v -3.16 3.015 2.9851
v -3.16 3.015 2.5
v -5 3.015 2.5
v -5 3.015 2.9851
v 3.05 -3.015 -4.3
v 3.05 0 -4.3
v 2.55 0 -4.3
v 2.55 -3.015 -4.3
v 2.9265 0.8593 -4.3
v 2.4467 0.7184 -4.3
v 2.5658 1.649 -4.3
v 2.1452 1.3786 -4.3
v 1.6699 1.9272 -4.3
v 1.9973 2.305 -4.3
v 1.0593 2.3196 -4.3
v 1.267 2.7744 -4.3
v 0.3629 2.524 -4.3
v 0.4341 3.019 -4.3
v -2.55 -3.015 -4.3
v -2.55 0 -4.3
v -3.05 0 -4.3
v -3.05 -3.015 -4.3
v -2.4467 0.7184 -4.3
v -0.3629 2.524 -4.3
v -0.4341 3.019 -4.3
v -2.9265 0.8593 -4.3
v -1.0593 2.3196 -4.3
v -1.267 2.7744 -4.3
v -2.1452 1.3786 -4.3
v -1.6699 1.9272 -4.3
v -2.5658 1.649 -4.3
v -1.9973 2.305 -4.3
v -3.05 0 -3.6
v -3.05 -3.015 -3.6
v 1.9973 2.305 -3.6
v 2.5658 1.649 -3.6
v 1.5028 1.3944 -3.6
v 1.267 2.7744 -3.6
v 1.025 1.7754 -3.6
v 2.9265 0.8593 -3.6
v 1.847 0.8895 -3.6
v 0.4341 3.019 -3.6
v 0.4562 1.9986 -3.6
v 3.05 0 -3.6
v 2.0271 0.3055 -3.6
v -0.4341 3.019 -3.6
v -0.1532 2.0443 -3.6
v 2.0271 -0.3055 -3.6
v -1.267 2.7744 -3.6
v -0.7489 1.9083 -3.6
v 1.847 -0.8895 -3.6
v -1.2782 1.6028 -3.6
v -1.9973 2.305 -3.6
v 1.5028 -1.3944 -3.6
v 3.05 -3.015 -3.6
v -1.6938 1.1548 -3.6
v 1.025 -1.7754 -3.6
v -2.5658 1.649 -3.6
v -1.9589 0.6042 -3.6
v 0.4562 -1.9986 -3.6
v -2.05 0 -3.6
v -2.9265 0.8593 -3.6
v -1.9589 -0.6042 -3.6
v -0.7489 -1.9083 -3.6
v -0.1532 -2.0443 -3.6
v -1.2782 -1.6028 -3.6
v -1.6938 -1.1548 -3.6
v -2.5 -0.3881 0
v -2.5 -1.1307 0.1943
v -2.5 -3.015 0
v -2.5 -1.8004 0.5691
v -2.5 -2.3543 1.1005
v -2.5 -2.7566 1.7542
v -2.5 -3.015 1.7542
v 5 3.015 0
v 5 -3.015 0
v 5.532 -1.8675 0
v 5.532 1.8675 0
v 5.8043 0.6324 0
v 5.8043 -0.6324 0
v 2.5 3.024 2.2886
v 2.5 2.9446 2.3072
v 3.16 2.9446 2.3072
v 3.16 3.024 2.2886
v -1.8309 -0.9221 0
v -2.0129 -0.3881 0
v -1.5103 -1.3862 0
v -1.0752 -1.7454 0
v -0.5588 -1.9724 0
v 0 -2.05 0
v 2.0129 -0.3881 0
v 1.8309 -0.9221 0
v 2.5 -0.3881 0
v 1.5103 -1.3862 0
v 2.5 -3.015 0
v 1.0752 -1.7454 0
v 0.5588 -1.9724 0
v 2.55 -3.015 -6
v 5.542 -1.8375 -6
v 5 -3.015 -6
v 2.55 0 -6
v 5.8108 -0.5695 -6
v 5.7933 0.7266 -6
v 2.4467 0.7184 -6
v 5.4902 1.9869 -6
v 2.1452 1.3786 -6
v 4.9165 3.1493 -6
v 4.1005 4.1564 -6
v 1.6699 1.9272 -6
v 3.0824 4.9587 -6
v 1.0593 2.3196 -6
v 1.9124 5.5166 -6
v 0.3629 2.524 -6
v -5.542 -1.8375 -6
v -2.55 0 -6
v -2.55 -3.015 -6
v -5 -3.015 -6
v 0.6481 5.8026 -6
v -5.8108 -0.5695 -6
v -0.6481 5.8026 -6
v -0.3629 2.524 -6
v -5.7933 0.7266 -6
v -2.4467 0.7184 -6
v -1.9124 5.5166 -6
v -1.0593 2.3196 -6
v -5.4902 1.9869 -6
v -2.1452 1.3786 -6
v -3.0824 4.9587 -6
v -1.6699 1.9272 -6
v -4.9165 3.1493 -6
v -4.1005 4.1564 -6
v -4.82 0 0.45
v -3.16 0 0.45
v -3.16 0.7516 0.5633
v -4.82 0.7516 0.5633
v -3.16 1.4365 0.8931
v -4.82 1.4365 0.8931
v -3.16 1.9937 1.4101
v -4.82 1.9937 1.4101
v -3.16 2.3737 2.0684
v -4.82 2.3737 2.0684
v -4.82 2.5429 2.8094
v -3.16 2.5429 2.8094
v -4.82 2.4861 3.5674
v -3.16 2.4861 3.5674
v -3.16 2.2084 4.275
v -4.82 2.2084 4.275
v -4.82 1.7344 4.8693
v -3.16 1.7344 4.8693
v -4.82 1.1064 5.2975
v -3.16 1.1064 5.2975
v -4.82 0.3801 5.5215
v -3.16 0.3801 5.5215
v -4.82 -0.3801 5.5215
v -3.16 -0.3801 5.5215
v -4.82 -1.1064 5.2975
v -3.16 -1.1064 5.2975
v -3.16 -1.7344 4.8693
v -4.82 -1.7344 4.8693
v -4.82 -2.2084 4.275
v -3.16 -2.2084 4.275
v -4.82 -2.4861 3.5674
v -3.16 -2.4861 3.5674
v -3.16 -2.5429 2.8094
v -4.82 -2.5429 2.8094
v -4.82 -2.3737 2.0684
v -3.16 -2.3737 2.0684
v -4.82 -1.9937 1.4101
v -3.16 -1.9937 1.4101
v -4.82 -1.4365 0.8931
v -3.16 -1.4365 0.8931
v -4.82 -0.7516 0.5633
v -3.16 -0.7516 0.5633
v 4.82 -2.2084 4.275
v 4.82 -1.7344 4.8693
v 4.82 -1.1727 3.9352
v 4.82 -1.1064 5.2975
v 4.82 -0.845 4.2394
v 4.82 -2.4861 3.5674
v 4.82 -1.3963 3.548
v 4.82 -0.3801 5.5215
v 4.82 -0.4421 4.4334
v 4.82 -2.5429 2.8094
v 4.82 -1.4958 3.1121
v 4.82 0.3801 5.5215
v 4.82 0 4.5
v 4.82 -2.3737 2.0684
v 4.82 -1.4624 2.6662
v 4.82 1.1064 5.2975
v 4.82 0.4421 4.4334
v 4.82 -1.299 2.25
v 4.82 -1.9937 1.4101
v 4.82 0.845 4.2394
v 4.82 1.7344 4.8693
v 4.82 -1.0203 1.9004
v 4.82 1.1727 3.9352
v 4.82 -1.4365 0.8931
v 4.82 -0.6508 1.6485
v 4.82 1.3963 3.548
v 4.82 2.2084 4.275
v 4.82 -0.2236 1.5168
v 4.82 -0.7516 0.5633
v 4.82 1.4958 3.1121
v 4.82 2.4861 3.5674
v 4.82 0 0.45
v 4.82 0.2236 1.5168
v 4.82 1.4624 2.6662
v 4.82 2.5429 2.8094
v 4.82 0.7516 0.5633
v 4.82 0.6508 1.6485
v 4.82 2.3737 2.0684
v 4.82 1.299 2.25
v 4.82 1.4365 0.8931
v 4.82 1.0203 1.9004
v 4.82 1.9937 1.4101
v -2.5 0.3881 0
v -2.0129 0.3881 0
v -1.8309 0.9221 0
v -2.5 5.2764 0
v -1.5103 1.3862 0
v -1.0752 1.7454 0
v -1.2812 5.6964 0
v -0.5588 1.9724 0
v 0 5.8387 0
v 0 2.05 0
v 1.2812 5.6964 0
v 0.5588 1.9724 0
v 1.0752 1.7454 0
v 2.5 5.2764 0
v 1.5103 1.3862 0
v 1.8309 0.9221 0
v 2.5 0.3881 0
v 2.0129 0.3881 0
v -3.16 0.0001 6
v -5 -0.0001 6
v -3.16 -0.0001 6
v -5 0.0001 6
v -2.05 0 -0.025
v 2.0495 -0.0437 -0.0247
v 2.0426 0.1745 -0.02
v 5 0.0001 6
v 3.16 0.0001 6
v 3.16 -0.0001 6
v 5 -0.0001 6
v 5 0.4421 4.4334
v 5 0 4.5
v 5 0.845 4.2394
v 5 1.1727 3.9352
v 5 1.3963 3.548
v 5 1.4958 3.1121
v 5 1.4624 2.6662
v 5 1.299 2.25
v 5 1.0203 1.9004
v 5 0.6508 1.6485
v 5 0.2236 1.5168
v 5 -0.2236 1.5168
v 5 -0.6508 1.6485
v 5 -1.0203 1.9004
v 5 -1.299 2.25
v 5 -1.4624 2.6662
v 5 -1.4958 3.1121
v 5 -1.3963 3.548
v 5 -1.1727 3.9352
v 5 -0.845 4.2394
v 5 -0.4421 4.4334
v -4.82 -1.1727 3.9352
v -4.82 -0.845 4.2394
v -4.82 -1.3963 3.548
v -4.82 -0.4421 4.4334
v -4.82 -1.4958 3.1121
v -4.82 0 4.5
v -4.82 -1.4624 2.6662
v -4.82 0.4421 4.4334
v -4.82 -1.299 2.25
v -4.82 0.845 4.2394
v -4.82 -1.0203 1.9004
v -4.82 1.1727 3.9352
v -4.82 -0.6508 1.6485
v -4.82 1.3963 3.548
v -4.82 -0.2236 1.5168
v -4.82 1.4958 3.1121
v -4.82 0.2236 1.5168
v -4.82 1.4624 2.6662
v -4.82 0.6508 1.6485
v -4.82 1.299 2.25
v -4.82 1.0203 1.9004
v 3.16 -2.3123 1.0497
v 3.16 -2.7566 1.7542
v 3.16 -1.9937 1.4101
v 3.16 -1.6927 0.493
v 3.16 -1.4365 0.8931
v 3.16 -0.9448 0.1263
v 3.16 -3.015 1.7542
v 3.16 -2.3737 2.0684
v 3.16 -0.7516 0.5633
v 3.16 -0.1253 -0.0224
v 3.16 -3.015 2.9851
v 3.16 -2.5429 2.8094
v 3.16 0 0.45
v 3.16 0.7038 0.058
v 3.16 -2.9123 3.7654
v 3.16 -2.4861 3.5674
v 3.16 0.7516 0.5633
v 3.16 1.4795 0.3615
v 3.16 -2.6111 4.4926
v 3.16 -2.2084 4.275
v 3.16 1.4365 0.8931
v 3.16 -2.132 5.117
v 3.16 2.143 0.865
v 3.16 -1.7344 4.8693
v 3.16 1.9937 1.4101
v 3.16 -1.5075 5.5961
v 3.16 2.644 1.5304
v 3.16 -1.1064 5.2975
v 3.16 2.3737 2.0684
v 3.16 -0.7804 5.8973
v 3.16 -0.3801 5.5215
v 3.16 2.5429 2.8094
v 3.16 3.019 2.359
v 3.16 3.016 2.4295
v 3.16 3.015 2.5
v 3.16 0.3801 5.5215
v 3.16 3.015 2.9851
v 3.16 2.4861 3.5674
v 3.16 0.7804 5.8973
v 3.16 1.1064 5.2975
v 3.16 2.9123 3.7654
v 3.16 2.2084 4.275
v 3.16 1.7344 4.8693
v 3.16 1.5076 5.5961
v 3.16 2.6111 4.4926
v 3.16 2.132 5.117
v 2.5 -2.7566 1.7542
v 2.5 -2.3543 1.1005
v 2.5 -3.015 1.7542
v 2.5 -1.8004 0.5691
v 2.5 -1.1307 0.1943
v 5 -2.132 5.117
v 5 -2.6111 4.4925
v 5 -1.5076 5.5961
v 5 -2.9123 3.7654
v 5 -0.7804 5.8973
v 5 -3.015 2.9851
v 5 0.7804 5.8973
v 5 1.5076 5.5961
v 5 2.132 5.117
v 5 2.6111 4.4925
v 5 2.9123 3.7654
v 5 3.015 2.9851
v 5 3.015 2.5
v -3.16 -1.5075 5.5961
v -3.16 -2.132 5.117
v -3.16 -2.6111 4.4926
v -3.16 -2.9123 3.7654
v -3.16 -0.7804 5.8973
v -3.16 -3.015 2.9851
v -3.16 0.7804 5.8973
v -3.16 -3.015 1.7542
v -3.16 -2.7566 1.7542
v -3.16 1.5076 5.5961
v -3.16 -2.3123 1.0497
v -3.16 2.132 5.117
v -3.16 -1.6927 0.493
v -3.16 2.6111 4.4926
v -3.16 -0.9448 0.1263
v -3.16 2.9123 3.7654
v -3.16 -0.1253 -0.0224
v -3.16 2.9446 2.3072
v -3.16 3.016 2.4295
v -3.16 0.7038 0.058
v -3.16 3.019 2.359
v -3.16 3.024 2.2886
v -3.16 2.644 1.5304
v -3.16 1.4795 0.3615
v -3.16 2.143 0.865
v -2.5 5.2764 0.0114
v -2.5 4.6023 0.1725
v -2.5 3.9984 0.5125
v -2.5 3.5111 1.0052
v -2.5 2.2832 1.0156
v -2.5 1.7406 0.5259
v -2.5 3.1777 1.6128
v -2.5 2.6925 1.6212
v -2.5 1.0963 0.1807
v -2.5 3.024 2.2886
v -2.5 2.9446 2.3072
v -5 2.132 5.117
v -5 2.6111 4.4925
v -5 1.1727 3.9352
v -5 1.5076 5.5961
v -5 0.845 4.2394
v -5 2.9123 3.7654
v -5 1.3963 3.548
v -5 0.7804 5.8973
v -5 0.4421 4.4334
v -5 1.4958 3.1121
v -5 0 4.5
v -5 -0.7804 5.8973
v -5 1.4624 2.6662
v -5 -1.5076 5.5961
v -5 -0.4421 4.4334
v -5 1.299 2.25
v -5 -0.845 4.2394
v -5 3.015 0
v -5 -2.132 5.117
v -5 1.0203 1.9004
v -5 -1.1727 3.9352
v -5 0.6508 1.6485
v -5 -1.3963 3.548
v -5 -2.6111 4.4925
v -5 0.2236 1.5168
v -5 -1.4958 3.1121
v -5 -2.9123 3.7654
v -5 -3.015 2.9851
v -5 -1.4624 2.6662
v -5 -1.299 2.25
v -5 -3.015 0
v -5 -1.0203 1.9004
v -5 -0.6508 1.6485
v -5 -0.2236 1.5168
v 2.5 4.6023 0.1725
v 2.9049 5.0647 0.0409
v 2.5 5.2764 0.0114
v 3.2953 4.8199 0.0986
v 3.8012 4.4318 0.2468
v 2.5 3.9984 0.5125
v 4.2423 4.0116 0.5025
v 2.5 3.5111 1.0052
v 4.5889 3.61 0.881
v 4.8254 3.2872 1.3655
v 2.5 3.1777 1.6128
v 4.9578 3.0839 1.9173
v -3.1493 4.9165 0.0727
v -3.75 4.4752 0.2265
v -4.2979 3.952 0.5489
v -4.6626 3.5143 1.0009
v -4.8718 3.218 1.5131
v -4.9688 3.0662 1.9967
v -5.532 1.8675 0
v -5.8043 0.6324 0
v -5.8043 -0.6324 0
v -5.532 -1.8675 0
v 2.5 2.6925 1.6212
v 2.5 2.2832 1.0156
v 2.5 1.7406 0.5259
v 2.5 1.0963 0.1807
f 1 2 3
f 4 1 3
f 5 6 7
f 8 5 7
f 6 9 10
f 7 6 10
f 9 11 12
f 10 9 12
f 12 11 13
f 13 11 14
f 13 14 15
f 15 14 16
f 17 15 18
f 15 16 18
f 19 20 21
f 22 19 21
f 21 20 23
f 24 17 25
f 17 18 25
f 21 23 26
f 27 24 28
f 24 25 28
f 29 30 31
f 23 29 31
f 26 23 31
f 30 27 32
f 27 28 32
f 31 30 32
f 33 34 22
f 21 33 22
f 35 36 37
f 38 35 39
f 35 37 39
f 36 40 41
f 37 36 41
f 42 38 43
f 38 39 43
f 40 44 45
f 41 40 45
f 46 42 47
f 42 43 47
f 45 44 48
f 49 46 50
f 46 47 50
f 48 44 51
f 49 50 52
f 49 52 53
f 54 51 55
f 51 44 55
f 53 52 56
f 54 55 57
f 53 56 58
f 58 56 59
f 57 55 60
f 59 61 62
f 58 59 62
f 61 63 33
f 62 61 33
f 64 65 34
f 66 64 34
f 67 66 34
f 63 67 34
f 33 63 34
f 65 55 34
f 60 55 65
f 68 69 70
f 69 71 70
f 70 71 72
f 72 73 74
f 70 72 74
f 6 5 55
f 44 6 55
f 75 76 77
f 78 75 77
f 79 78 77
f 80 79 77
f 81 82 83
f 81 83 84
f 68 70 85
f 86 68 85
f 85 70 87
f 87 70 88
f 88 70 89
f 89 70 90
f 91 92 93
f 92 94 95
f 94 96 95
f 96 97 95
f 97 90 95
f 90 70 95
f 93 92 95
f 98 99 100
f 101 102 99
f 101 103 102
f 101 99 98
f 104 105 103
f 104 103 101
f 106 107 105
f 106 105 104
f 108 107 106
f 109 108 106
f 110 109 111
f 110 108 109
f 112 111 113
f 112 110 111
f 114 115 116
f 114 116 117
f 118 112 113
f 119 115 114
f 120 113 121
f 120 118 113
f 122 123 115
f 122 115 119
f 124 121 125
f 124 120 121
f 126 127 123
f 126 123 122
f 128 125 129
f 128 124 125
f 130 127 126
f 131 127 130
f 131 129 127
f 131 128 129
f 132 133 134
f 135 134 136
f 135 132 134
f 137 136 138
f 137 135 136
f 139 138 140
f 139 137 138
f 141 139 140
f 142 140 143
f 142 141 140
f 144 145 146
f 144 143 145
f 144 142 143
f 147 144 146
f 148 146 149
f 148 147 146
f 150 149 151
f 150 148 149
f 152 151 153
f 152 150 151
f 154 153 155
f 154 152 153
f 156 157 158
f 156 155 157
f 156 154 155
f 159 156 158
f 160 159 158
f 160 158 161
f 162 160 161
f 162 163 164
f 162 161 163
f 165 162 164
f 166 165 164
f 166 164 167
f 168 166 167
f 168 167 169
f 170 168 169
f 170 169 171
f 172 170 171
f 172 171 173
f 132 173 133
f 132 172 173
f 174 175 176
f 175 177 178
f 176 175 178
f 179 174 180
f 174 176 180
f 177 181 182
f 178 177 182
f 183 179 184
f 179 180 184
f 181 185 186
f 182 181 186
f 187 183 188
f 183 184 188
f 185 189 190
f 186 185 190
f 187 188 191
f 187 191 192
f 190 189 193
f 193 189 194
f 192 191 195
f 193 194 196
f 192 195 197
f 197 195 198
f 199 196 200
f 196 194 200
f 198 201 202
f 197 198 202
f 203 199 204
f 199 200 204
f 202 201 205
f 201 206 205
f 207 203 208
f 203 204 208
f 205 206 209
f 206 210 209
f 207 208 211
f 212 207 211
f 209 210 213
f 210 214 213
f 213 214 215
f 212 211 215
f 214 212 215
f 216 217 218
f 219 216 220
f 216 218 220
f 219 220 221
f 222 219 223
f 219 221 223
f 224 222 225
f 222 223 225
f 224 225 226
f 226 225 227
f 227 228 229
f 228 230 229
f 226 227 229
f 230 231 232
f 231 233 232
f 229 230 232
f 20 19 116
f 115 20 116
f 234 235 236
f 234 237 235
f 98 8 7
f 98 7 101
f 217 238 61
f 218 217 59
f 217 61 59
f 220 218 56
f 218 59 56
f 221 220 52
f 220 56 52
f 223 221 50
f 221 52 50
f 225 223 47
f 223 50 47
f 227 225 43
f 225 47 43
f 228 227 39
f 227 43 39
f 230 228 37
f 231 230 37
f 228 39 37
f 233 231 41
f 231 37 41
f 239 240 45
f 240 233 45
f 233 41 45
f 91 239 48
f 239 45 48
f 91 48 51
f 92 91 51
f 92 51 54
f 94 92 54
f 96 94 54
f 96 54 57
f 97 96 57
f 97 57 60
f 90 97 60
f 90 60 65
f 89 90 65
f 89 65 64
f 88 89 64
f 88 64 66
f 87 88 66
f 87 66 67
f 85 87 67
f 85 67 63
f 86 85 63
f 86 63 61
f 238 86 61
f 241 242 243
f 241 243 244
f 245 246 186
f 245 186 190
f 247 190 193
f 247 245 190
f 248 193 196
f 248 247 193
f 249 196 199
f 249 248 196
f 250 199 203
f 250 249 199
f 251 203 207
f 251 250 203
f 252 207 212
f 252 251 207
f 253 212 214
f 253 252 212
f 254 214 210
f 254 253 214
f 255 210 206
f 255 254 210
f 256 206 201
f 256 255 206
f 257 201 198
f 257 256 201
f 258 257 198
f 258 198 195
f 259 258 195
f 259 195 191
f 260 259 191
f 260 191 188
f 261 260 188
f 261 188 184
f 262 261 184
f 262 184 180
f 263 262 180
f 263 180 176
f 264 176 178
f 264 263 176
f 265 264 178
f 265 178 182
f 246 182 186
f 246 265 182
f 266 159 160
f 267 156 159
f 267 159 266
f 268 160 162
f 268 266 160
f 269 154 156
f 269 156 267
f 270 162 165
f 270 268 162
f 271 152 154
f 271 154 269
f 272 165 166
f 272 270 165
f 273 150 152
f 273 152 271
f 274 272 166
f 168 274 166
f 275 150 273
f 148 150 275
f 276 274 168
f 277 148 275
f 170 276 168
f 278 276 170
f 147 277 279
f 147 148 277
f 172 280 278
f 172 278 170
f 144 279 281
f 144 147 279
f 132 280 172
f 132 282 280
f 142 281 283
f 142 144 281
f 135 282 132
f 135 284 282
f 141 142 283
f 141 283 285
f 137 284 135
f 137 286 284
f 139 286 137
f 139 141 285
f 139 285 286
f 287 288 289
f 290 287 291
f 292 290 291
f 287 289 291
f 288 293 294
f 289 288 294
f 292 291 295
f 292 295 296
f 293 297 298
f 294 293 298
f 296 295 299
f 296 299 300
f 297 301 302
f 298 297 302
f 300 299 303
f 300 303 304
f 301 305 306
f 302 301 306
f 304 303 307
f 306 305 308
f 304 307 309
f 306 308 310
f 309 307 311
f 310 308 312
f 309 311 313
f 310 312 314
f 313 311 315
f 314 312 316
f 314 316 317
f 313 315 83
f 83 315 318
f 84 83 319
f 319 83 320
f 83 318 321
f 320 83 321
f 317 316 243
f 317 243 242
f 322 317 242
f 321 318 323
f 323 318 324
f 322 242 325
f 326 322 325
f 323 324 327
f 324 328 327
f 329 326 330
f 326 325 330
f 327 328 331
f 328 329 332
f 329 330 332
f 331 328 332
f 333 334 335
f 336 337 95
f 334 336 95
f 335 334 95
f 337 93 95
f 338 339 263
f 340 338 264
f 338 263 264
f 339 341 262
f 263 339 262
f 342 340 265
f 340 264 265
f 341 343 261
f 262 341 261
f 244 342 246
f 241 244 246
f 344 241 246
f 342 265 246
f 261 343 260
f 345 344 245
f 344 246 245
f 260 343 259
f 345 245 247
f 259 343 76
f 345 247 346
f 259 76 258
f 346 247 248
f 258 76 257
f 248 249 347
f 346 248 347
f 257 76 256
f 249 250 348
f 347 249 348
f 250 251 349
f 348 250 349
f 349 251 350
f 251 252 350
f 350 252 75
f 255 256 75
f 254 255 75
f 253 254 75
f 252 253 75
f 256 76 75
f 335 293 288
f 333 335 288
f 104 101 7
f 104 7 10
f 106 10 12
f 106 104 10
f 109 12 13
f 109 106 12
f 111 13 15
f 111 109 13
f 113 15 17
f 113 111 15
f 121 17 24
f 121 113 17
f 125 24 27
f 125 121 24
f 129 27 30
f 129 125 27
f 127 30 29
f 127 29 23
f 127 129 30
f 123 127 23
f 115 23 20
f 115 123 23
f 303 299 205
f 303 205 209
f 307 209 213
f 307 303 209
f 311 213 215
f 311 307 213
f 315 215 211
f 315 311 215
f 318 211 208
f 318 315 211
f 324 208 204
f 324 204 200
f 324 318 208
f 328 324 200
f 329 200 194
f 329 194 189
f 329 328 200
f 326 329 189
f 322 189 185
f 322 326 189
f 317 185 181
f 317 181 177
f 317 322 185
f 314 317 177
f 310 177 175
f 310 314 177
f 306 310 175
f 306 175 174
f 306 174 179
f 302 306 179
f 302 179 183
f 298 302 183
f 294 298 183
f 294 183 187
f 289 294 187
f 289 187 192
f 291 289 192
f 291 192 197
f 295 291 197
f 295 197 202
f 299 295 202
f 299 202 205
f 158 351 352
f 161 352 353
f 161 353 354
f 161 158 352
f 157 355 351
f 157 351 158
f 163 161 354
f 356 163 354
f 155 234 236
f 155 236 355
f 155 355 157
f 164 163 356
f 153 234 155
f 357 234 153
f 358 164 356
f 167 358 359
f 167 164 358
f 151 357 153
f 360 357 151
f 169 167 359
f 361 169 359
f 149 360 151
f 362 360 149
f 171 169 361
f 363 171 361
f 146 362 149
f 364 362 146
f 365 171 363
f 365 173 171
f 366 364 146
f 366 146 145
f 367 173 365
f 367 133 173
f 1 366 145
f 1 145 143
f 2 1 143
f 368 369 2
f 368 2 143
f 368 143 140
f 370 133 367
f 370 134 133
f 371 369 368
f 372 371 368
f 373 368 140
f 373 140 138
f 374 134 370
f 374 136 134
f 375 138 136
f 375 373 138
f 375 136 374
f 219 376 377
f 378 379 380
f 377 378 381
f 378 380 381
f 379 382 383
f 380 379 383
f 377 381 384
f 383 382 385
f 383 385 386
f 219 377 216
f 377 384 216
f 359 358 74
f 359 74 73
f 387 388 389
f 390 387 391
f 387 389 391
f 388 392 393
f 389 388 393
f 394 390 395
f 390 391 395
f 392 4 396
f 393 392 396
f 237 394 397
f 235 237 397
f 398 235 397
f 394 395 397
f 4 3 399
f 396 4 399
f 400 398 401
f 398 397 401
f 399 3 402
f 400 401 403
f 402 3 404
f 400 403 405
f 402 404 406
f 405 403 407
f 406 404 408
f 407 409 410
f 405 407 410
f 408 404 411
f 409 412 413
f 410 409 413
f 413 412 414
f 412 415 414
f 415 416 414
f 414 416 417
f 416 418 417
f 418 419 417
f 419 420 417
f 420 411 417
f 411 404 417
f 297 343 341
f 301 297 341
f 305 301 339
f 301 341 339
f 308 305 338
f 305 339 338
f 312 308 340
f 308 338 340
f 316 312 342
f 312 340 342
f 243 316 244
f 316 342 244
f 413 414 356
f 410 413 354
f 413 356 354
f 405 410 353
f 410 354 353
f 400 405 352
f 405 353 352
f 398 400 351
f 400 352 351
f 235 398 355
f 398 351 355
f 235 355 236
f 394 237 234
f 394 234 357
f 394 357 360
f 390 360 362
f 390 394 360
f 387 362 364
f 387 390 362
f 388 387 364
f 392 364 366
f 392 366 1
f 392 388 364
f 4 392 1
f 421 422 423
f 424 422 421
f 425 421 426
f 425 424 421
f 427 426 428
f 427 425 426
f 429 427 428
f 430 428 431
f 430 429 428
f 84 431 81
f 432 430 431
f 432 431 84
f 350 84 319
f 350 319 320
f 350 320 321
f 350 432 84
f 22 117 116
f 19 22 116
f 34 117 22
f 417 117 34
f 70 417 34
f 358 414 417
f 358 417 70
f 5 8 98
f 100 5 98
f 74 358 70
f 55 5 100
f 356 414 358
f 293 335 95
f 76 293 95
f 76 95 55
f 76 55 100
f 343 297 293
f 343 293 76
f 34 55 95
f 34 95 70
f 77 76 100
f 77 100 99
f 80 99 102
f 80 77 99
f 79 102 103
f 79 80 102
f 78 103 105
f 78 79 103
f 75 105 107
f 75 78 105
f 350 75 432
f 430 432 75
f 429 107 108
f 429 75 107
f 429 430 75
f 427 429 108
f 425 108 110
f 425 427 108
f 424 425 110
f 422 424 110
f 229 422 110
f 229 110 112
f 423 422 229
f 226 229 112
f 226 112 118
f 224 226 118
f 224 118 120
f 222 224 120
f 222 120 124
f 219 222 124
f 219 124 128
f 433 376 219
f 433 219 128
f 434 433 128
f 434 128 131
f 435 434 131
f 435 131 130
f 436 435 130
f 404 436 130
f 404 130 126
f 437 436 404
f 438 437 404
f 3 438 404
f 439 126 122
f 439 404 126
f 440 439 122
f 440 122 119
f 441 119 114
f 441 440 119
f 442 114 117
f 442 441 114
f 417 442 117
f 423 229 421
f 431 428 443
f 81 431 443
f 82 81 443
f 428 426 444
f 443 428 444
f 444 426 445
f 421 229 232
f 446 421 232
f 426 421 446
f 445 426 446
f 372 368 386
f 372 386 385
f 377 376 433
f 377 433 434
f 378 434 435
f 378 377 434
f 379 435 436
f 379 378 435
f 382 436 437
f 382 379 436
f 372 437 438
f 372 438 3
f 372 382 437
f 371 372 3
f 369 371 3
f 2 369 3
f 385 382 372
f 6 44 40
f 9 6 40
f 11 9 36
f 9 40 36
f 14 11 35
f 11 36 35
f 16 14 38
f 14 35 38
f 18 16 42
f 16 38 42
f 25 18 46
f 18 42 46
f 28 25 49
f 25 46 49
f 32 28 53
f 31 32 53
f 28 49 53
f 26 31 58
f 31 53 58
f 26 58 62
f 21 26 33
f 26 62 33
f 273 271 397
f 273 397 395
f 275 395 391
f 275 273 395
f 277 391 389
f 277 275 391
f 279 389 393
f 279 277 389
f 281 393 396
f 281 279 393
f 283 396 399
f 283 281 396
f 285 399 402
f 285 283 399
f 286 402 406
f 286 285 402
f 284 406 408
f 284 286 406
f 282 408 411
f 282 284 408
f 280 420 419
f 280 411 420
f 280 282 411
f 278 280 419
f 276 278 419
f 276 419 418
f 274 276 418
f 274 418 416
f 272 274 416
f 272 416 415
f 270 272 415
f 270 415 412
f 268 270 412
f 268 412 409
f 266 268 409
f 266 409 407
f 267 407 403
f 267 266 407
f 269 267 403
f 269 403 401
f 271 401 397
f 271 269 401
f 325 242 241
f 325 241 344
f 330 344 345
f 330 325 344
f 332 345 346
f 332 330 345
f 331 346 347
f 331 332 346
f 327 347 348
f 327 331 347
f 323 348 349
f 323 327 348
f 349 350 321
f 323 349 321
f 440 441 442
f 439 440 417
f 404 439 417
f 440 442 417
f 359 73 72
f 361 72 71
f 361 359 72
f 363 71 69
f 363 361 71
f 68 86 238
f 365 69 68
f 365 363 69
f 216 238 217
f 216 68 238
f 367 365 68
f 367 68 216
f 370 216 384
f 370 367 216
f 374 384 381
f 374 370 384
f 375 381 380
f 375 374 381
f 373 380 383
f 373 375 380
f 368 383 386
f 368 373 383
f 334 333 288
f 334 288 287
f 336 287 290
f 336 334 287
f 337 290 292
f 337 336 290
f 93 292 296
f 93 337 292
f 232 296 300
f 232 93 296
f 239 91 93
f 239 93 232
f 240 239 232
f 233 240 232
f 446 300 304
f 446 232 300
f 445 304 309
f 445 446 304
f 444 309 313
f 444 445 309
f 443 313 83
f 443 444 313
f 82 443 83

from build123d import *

# Parameters (mm, degrees)
BOSS_EXTRUDE1_DEPTH      = 6
BOSS_EXTRUDE1_2_DEPTH    = 6
SKETCH2_R                = 5.838683498871983
BOSS_EXTRUDE2_DEPTH      = 6
CUT_EXTRUDE1_DEPTH       = 14.695520617658893
CUT_EXTRUDE1_DEPTH_BACK  = 14.695520617658893
SKETCH4_R                = 1.5000000000000004
SKETCH5_W                = 10
SKETCH5_H                = 5.878381978264198
CUT_EXTRUDE2_DEPTH       = 6
CUT_EXTRUDE19_DEPTH      = 11.206882481933452
CUT_EXTRUDE19_DEPTH_BACK = 11.206882481933452
SKETCH31_R               = 1.1
SKETCH33_W               = 5.1
SKETCH33_H               = 1.7000000000000002
CUT_EXTRUDE20_DEPTH      = 6.03
BOSS_EXTRUDE3_DEPTH      = 0.7
BOSS_EXTRUDE4_DEPTH      = 1.7
CUT_EXTRUDE21_START      = 0.7
SKETCH36_R               = 3.05
CUT_EXTRUDE21_DEPTH      = 0.7
SKETCH37_R               = 2.05
CUT_EXTRUDE22_DEPTH      = 6.03
FILLET1_R                = 3.015
FILLET2_R                = 2.5
CUT_EXTRUDE23_DEPTH      = 4.82
CUT_EXTRUDE23_DEPTH_BACK = 4.82
SKETCH39_R               = 2.5500000000000003
CUT_EXTRUDE24_DEPTH      = 3.16
CUT_EXTRUDE24_DEPTH_BACK = 3.16
SKETCH40_R               = 3.025
CHAMFER1_START           = -3.16
CHAMFER1_DEPTH           = 6.32


with BuildPart() as part:
    # Sketch1 → Boss-Extrude1 (new body)
    with BuildSketch(Plane.XY):
        Polygon((-2.4999999999999982, -3.015), (-2.499999999999999, 3.015), (-4.999999999999999, 3.015), (-4.999999999999999, -3.015), align=None)
    extrude(amount=BOSS_EXTRUDE1_DEPTH)



with BuildPart() as body_2:
    # Sketch1 → Boss-Extrude1 2 (new body)
    with BuildSketch(Plane.XY):
        Polygon((5.000000000000001, 3.015), (2.500000000000001, 3.015), (2.5000000000000018, -3.015), (5.000000000000001, -3.015), align=None)
    extrude(amount=BOSS_EXTRUDE1_2_DEPTH)


with BuildPart() as part_1:
    add(part.part)

    add(body_2.part)  # Boss-Extrude2 merges body 2
    # Sketch2 → Boss-Extrude2 (add)
    with BuildSketch(Plane(origin=(0, 0, 0), x_dir=(-1, 0, 0), z_dir=(0, 0, -1))):
        with Locations(Location((0, 0, 0), (0, 0, 148.91002298))):
            Circle(SKETCH2_R)
    extrude(amount=BOSS_EXTRUDE2_DEPTH)

    # Sketch4 → Cut-Extrude1 (cut, two sides: drawn at the far end of the back side and taken through both)
    with BuildSketch(Plane.ZY.offset(4.999999999999999).offset(-CUT_EXTRUDE1_DEPTH_BACK)):
        with Locations((3, 0)):
            Circle(SKETCH4_R)
    extrude(amount=CUT_EXTRUDE1_DEPTH + CUT_EXTRUDE1_DEPTH_BACK, mode=Mode.SUBTRACT)

    # Sketch5 → Cut-Extrude2 (cut)
    with BuildSketch(Plane.XY):
        with Locations((4.4e-16, -5.954190989132099)):
            Rectangle(SKETCH5_W, SKETCH5_H)
    extrude(amount=-CUT_EXTRUDE2_DEPTH, mode=Mode.SUBTRACT)

    # Sketch31 → Cut-Extrude19 (cut, two sides: drawn at the far end of the back side and taken through both)
    with BuildSketch(Plane.XY.offset(-CUT_EXTRUDE19_DEPTH_BACK)):
        Circle(SKETCH31_R)
    extrude(amount=CUT_EXTRUDE19_DEPTH + CUT_EXTRUDE19_DEPTH_BACK, mode=Mode.SUBTRACT)

    # Sketch33 → Cut-Extrude20 (cut)
    with BuildSketch(Plane(origin=(0, -3.015, 0), x_dir=(-1, 0, 0), z_dir=(0, -1, 0))):
        with Locations((-8.9e-16, 5.15)):
            Rectangle(SKETCH33_W, SKETCH33_H)
        Polygon((3.0500000000000056, 4.299999999999999), (2.549999999999999, 4.299999999999999), (-2.5500000000000007, 4.3), (-3.049999999999994, 4.299999999999999), (-3.049999999999994, 3.599999999999999), (3.0500000000000056, 3.6), align=None)
    extrude(amount=-CUT_EXTRUDE20_DEPTH, mode=Mode.SUBTRACT)

    # Sketch34 → Boss-Extrude3 (add)
    with BuildSketch(Plane(origin=(5.1e-16, 0, -3.5999999999999996), x_dir=(-1, 0, -1.4e-16), z_dir=(1.4e-16, 0, -1))):
        with BuildLine():
            ThreePointArc((0.4607331114646439, 3.0150000000000117), (2.313842690198183, 1.9871165051441753), (3.049999999999994, 0))
            Line((3.049999999999994, 0), (3.050000000000006, 3.015))
            Line((3.050000000000006, 3.015), (0.46073311146464313, 3.015))
        make_face()
        with BuildLine():
            Line((-3.0499999999999936, 3.015), (-3.049999999999994, 0))
            ThreePointArc((-3.049999999999994, 3.7e-16), (-2.313842690198182, 1.987116505144176), (-0.46073311146464346, 3.0150000000000117))
            Line((-0.4607331114646427, 3.015), (-3.0499999999999936, 3.015))
        make_face()
    extrude(amount=BOSS_EXTRUDE3_DEPTH)

    # Sketch35 → Boss-Extrude4 (add)
    with BuildSketch(Plane(origin=(0, 0, -6), x_dir=(-1, 0, 0), z_dir=(0, 0, -1))):
        with BuildLine():
            ThreePointArc((-2.550000000000001, -8.2e-16), (-4.1e-16, 2.550000000000001), (2.550000000000001, 0))
            Line((2.5500000000000007, 0), (2.549999999999999, 3.015))
            Line((2.549999999999999, 3.015), (-2.5500000000000007, 3.015))
            Line((-2.5500000000000007, 3.015), (-2.5500000000000007, 0))
        make_face()
    extrude(amount=-BOSS_EXTRUDE4_DEPTH)

    # Sketch36 → Cut-Extrude21 (cut)
    with BuildSketch(Plane.XY.offset(-4.299999999999999).offset(CUT_EXTRUDE21_START)):
        Circle(SKETCH36_R)
    extrude(amount=-CUT_EXTRUDE21_DEPTH, mode=Mode.SUBTRACT)

    # Sketch37 → Cut-Extrude22 (cut)
    with BuildSketch(Plane(origin=(5.1e-16, 0, -3.5999999999999996), x_dir=(-1, 0, -1.4e-16), z_dir=(1.4e-16, 0, -1))):
        Circle(SKETCH37_R)
    extrude(amount=-CUT_EXTRUDE22_DEPTH, mode=Mode.SUBTRACT)

    # Fillet1
    fillet1_edges = [part_1.edges().sort_by_distance(p)[0] for p in [
        (-3.749999999999999, 3.015, 6),
        (-3.7499999999999987, -3.015, 6),
        (3.7500000000000013, -3.015, 6),
        (3.750000000000001, 3.015, 6),
    ]]
    fillet(fillet1_edges, radius=FILLET1_R - 0.0001)  # a hair under: the kernel refuses the full size

    # Fillet2
    # the kernel refuses this fillet: 2.5 mm, written as the material it adds along each edge
    with BuildSketch(Plane(origin=(5.000000000000001, 3.015, 0), x_dir=(0, 1, 0), z_dir=(-1, 0, 0))) as fillet2_piece_1_section:
        with BuildLine():
            CenterArc((FILLET2_R, -FILLET2_R), FILLET2_R, 90, 90)
            Line((-4.4e-16, -FILLET2_R), (0, 0))
            Line((0, 0), (FILLET2_R, 0))
        make_face()
    fillet2_piece_1 = extrude(amount=2.5, mode=Mode.PRIVATE)
    fillet2_piece_1 = fillet2_piece_1 & Plane(origin=(0, 0, 0), x_dir=(0.8563574307404789, 0.5163835307361826, 0), z_dir=(0, 0, 1)) * Cylinder(5.838683498871983, 15, mode=Mode.PRIVATE)
    add(fillet2_piece_1)
    with BuildSketch(Plane(origin=(5.000000000000001, 3.015, 0), x_dir=(0, 1, 0), z_dir=(-1, 0, 0))) as fillet2_piece_2_section:
        with BuildLine():
            CenterArc((FILLET2_R, -FILLET2_R), FILLET2_R, 90, 90)
            Line((-4.4e-16, -FILLET2_R), (0, 0))
            Line((0, 0), (FILLET2_R, 0))
        make_face()
    fillet2_piece_2 = extrude(amount=8.749999999999998, mode=Mode.PRIVATE)
    fillet2_piece_2 = fillet2_piece_2 & Plane(origin=(0, 0, 0), x_dir=(0.8563574307404789, 0.5163835307361826, 0), z_dir=(0, 0, 1)) * Cylinder(5.838683498871983, 28, mode=Mode.PRIVATE)
    fillet2_piece_2 = split(fillet2_piece_2, bisect_by=Plane(origin=(-2.499999999999999, 3.0149999999999992, 0), z_dir=(-1, -1.5e-16, 0)), keep=Keep.TOP, mode=Mode.PRIVATE)
    add(fillet2_piece_2)
    with BuildSketch(Plane(origin=(3.75, 3.015, 0), x_dir=(0, 1, 0), z_dir=(-1, 0, 0))) as fillet2_piece_3_section:
        with BuildLine():
            CenterArc((FILLET2_R, -FILLET2_R), FILLET2_R, 90, 90)
            Line((-4.4e-16, -FILLET2_R), (0, 0))
            Line((0, 0), (FILLET2_R, 0))
        make_face()
    fillet2_piece_3 = extrude(amount=8.75, mode=Mode.PRIVATE)
    fillet2_piece_3 = fillet2_piece_3 & Plane(origin=(0, 0, 0), x_dir=(0.8563574307404789, 0.5163835307361826, 0), z_dir=(0, 0, 1)) * Cylinder(5.838683498871983, 28, mode=Mode.PRIVATE)
    fillet2_piece_3 = split(fillet2_piece_3, bisect_by=Plane(origin=(2.500000000000001, 3.015, 0), z_dir=(1, 1.5e-16, 0)), keep=Keep.TOP, mode=Mode.PRIVATE)
    add(fillet2_piece_3)
    with BuildSketch(Plane(origin=(-2.499999999999999, 3.015, 0), x_dir=(0, 1, 0), z_dir=(-1, 0, 0))) as fillet2_piece_4_section:
        with BuildLine():
            CenterArc((FILLET2_R, -FILLET2_R), FILLET2_R, 90, 90)
            Line((-4.4e-16, -FILLET2_R), (0, 0))
            Line((0, 0), (FILLET2_R, 0))
        make_face()
    fillet2_piece_4 = extrude(amount=2.5, mode=Mode.PRIVATE)
    fillet2_piece_4 = fillet2_piece_4 & Plane(origin=(0, 0, 0), x_dir=(0.8563574307404789, 0.5163835307361826, 0), z_dir=(0, 0, 1)) * Cylinder(5.838683498871983, 15, mode=Mode.PRIVATE)
    add(fillet2_piece_4)

    # Sketch39 → Cut-Extrude23 (cut, two sides: drawn at the far end of the back side and taken through both)
    with BuildSketch(Plane(origin=(0, 0, 0), x_dir=(0, 0, -1), z_dir=(1, 0, 0)).offset(-CUT_EXTRUDE23_DEPTH_BACK)):
        with Locations((-3, 0)):
            Circle(SKETCH39_R)
    extrude(amount=CUT_EXTRUDE23_DEPTH + CUT_EXTRUDE23_DEPTH_BACK, mode=Mode.SUBTRACT)

    # Sketch40 → Cut-Extrude24 (cut, two sides: drawn at the far end of the back side and taken through both)
    with BuildSketch(Plane(origin=(0, 0, 0), x_dir=(0, 0, -1), z_dir=(1, 0, 0)).offset(-CUT_EXTRUDE24_DEPTH_BACK)):
        with Locations((-3, 0)):
            Circle(SKETCH40_R)
    extrude(amount=CUT_EXTRUDE24_DEPTH + CUT_EXTRUDE24_DEPTH_BACK, mode=Mode.SUBTRACT)

    # Chamfer1: read off the stored shape, not the designer's step
    # Chamfer1 outline → Chamfer1 (cut)
    with BuildSketch(Plane.YZ.offset(CHAMFER1_START)):
        with BuildLine():
            ThreePointArc((3.015, 2.754235885), (2.988173778, 2.529423252), (2.944608274, 2.307246717))
            Line((2.944608274, 2.307246717), (3.023955784, 2.288579294))
            ThreePointArc((3.023955784, 2.288579294), (3.01723995, 2.394194848), (3.015, 2.5))
            Line((3.015, 2.5), (3.015, 2.754235885))
        make_face()
        with BuildLine():
            Line((-3.015, 1.754235885), (-2.756573375, 1.754235885))
            ThreePointArc((-2.756573375, 1.754235885), (-2.928782137, 2.243124716), (-3.015, 2.754235885))
            Line((-3.015, 2.754235885), (-3.015, 1.754235885))
        make_face()
    extrude(amount=CHAMFER1_DEPTH, mode=Mode.SUBTRACT)


solid = part_1.part
